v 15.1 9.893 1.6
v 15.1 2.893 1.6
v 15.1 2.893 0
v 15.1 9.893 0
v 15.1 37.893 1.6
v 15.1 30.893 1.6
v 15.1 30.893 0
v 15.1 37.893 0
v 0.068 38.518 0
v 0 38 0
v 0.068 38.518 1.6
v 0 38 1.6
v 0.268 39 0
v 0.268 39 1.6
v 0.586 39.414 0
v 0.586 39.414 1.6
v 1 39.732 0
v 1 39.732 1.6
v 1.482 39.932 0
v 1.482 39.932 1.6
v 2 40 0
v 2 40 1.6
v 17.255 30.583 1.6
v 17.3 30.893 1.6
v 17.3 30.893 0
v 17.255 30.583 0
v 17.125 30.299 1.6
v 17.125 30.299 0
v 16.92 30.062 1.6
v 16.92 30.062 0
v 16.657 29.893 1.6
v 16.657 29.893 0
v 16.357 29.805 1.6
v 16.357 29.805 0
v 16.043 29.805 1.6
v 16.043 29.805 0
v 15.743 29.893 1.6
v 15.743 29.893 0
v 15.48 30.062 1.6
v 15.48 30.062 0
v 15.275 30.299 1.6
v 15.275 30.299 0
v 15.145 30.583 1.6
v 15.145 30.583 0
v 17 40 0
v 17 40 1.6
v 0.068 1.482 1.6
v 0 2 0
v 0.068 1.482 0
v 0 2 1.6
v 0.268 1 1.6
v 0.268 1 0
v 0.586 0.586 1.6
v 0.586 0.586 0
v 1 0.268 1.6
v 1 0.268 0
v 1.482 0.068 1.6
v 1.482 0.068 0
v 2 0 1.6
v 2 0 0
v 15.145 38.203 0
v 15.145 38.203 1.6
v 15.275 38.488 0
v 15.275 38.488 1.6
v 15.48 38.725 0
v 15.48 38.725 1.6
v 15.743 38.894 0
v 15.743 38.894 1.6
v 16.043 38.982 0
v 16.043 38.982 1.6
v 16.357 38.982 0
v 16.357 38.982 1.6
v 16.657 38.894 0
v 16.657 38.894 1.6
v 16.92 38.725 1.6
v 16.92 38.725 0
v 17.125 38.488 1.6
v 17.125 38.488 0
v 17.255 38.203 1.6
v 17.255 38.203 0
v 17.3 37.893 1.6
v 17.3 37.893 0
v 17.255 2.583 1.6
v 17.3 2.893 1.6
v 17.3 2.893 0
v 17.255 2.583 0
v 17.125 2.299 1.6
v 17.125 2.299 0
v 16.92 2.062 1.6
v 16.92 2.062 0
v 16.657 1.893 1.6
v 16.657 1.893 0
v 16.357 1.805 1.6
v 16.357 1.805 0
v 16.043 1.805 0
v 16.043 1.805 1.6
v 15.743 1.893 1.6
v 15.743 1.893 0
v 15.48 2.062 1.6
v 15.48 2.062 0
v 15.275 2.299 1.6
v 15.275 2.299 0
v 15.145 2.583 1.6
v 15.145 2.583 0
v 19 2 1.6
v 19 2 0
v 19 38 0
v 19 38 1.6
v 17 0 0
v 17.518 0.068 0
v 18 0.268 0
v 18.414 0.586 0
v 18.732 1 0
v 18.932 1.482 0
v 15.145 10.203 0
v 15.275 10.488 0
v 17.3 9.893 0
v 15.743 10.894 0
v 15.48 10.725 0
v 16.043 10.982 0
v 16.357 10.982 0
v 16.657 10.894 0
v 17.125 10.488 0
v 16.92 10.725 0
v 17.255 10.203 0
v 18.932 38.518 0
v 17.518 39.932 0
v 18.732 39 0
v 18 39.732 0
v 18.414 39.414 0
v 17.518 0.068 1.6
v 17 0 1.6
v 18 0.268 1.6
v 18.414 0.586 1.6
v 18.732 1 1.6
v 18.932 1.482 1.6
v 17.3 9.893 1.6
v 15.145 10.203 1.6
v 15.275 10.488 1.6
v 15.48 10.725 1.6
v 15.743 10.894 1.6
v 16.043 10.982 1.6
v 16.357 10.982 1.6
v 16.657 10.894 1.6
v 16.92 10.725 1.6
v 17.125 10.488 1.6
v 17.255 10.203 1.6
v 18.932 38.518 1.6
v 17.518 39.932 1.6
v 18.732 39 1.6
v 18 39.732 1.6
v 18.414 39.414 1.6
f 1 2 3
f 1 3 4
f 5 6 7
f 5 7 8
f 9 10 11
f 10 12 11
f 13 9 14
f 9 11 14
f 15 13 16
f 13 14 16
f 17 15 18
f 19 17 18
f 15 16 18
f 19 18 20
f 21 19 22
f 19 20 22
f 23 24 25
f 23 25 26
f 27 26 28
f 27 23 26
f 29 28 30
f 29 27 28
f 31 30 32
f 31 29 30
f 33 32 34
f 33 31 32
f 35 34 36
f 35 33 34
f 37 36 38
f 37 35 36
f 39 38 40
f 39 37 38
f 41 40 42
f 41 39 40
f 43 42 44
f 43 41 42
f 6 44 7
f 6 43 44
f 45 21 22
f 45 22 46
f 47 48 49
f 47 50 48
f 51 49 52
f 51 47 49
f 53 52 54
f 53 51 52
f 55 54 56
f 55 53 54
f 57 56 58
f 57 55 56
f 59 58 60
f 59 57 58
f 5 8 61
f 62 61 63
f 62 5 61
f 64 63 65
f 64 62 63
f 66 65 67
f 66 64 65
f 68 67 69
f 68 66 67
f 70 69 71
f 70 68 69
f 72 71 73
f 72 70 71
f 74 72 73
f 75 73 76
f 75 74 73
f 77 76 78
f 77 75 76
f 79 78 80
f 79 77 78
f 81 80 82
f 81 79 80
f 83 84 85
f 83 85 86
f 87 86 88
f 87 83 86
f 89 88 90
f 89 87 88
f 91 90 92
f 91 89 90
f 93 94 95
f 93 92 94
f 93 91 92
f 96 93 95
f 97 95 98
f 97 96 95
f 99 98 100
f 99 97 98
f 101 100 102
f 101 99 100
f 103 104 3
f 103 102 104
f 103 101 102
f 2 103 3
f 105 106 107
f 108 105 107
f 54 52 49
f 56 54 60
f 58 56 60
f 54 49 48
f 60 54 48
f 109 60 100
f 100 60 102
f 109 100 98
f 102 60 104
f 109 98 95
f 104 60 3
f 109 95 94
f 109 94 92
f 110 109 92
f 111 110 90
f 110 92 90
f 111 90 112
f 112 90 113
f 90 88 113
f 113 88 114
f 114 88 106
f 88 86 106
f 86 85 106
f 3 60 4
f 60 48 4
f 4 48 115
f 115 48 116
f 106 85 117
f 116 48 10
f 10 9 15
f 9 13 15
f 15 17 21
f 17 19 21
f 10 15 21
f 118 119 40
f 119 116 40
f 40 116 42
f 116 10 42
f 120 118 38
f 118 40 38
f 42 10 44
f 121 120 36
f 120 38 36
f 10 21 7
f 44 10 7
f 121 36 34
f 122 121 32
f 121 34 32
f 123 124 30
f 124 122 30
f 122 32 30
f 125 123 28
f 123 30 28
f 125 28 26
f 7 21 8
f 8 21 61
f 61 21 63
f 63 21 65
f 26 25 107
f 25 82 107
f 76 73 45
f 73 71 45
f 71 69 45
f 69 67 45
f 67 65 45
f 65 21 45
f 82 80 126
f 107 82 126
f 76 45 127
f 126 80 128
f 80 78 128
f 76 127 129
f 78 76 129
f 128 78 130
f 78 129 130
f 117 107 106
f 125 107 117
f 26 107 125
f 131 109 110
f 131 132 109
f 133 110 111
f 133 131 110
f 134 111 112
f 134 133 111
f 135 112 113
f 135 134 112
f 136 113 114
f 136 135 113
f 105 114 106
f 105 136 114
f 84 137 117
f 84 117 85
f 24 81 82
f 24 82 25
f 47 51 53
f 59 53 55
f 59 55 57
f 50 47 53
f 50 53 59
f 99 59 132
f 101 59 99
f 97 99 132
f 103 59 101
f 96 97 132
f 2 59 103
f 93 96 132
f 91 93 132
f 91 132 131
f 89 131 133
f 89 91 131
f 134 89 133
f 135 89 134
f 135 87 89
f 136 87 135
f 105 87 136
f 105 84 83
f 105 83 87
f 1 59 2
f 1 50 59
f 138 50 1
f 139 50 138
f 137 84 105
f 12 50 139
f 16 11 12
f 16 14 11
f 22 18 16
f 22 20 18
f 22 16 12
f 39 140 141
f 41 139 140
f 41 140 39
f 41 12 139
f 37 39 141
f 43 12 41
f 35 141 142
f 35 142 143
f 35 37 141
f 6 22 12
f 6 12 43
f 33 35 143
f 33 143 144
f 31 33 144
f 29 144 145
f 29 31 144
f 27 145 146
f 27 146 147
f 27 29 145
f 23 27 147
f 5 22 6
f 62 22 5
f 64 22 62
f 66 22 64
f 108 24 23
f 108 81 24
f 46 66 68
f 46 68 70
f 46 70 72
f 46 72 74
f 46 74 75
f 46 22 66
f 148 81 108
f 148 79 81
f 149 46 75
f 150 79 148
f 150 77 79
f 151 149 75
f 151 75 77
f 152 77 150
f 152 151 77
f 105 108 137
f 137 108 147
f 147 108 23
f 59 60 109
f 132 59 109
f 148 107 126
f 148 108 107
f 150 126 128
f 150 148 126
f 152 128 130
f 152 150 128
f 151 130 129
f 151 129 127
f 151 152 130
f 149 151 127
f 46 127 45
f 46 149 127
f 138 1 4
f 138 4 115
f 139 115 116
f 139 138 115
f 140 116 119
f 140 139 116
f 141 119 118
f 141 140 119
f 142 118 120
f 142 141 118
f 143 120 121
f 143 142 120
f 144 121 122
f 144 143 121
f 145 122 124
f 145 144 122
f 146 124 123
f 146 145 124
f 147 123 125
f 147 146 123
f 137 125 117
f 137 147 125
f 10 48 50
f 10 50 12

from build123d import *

# Parameters (mm, degrees)
SKETCH_1_W          = 19
SKETCH_1_H          = 40
EXTRUDE_1_DEPTH     = 1.6
FILLET_1_R          = 2
CUT_EXTRUDE_1_DEPTH = 45.312075104


with BuildPart() as part:
    # Эскиз1 → Бобышка-Вытянуть1 (new body)
    with BuildSketch(Plane.XY):
        with Locations((9.5, 20)):
            Rectangle(SKETCH_1_W, SKETCH_1_H)
    extrude(amount=EXTRUDE_1_DEPTH)

    # Скругление1
    fillet_1_edges = [part.edges().sort_by_distance(p)[0] for p in [
        (0, 40, 0.8),
        (19, 40, 0.8),
        (19, 0, 0.8),
        (0, 0, 0.8),
    ]]
    fillet(fillet_1_edges, radius=FILLET_1_R)

    # Эскиз3 → Вырез-Вытянуть1 (cut, through all)
    with BuildSketch(Plane.XY.offset(1.6)):
        with BuildLine():
            Line((15.1, 2.893381891), (15.1, 9.893381891))
            ThreePointArc((15.1, 9.893381891), (16.2, 10.993381891), (17.3, 9.893381891))
            Line((17.3, 9.893381891), (17.3, 2.893381891))
            ThreePointArc((17.3, 2.893381891), (16.2, 1.793381891), (15.1, 2.893381891))
        make_face()
        with BuildLine():
            Line((15.1, 30.893381891), (15.1, 37.893381891))
            ThreePointArc((15.1, 37.893381891), (16.2, 38.993381891), (17.3, 37.893381891))
            Line((17.3, 37.893381891), (17.3, 30.893381891))
            ThreePointArc((17.3, 30.893381891), (16.2, 29.793381891), (15.1, 30.893381891))
        make_face()
    extrude(amount=-CUT_EXTRUDE_1_DEPTH, mode=Mode.SUBTRACT)


solid = part.part
